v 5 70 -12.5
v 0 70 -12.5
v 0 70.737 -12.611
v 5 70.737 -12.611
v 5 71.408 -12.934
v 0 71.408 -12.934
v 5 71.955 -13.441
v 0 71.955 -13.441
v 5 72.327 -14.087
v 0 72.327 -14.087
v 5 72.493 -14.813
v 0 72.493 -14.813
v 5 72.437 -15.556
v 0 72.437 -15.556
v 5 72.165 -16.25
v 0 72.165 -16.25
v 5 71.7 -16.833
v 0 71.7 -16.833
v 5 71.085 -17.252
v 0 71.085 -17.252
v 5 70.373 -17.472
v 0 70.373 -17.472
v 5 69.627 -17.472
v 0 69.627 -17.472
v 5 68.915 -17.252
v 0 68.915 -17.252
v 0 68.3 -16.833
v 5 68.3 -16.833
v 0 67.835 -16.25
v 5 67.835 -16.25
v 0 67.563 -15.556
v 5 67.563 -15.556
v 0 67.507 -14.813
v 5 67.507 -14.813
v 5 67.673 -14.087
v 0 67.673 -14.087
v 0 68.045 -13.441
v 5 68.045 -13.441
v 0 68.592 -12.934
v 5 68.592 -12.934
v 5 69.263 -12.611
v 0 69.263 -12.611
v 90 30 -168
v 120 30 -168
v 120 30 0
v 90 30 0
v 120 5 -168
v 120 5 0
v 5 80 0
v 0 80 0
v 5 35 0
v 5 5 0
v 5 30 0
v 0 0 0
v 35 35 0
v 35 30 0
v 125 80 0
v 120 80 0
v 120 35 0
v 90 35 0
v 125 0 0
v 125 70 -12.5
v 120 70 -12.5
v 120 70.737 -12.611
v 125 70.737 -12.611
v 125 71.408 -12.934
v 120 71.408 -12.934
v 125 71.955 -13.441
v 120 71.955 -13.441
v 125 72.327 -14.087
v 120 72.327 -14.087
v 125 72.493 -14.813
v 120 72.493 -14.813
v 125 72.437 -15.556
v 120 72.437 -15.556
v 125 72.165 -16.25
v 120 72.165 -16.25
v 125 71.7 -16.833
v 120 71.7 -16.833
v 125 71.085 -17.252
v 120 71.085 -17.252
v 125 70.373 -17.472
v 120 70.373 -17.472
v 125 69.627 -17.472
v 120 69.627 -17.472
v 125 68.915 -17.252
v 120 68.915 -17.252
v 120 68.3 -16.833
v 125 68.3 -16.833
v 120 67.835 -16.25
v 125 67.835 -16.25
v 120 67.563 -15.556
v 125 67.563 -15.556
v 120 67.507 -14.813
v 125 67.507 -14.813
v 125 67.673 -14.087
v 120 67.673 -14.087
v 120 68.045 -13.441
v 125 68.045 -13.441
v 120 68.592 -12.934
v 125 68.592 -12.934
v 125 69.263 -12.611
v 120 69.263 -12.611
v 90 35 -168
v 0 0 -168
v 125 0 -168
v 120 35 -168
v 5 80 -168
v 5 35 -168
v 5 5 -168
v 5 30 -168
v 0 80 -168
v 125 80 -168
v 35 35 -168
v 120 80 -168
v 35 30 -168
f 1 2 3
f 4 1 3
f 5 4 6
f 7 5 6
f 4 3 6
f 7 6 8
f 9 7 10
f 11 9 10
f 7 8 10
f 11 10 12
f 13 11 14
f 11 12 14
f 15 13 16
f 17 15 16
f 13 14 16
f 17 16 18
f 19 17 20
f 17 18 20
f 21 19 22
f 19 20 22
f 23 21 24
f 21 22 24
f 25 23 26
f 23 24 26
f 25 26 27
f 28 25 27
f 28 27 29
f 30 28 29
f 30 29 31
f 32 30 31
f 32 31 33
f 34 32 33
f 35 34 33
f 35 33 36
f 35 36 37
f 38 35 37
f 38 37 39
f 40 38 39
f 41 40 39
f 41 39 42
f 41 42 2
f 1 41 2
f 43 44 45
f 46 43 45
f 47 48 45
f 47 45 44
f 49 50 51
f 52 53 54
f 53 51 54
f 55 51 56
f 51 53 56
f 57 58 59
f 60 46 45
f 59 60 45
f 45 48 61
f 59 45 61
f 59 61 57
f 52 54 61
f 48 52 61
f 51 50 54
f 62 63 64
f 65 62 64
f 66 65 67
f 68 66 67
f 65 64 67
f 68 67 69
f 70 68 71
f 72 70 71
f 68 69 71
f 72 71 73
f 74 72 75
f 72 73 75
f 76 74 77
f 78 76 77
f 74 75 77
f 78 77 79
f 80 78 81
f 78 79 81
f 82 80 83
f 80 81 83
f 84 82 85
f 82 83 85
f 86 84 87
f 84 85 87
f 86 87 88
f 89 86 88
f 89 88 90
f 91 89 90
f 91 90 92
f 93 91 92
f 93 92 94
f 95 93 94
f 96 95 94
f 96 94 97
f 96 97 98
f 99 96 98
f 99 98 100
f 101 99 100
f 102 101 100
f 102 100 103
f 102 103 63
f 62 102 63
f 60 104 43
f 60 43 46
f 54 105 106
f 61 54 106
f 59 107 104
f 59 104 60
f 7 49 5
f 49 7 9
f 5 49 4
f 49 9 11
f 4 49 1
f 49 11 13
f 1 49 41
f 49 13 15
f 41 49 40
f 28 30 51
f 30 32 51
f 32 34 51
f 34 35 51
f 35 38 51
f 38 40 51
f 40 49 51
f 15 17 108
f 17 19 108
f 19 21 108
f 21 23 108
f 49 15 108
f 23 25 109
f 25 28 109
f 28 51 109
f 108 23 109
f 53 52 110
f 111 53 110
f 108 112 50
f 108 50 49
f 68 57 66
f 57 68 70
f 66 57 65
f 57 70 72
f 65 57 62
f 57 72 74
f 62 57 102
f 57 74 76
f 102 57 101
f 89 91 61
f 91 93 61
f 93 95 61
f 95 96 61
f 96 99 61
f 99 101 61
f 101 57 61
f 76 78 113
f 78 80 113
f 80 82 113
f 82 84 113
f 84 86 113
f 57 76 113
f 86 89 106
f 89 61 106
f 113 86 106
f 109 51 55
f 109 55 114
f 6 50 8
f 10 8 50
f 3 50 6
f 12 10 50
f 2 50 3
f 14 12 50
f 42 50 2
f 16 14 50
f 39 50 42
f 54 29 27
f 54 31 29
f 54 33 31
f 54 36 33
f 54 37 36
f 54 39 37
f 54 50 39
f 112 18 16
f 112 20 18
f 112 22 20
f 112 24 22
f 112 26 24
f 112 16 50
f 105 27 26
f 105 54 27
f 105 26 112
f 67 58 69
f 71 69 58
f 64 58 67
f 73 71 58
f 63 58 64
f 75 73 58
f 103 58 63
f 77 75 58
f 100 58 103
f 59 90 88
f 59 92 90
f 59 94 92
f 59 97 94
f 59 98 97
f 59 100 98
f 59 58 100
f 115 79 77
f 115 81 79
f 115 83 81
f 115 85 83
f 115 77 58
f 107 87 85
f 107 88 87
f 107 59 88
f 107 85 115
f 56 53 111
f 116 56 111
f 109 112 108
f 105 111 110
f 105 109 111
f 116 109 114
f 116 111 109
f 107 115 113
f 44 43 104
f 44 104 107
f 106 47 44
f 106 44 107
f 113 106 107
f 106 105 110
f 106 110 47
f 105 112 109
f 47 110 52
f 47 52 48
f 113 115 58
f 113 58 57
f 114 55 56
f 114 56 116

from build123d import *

# Parameters (mm, degrees)
CROQUIS1_W                 = 125
CROQUIS1_H                 = 168
SALIENTE_EXTRUIR1_DEPTH    = 5
CROQUIS2_W                 = 5
CROQUIS2_H                 = 168
SALIENTE_EXTRUIR2_DEPTH    = 75
CROQUIS3_W                 = 5
CROQUIS3_H                 = 168
SALIENTE_EXTRUIR3_DEPTH    = 75
CROQUIS4_W                 = 168
CROQUIS4_H                 = 5
SALIENTE_EXTRUIR4_DEPTH    = 30
CROQUIS5_W                 = 168
CROQUIS5_H                 = 5
SALIENTE_EXTRUIR5_DEPTH    = 30
CROQUIS6_R                 = 2.5
CORTAR_EXTRUIR1_DEPTH      = 31
CORTAR_EXTRUIR1_DEPTH_BACK = 135


with BuildPart() as part:
    # Croquis1 → Saliente-Extruir1 (new body)
    with BuildSketch(Plane(origin=(0, 0, 0), x_dir=(1, 0, 0), z_dir=(0, 1, 0))):
        with Locations((62.5, 84)):
            Rectangle(CROQUIS1_W, CROQUIS1_H)
    extrude(amount=SALIENTE_EXTRUIR1_DEPTH)

    # Croquis2 → Saliente-Extruir2 (add)
    with BuildSketch(Plane(origin=(0, 5, 0), x_dir=(1, 0, 0), z_dir=(0, 1, 0))):
        with Locations((2.5, 84)):
            Rectangle(CROQUIS2_W, CROQUIS2_H)
    extrude(amount=SALIENTE_EXTRUIR2_DEPTH)

    # Croquis3 → Saliente-Extruir3 (add)
    with BuildSketch(Plane(origin=(0, 5, 0), x_dir=(1, 0, 0), z_dir=(0, 1, 0))):
        with Locations((122.5, 84)):
            Rectangle(CROQUIS3_W, CROQUIS3_H)
    extrude(amount=SALIENTE_EXTRUIR3_DEPTH)

    # Croquis4 → Saliente-Extruir4 (add)
    with BuildSketch(Plane(origin=(5, 0, 0), x_dir=(0, 0, -1), z_dir=(1, 0, 0))):
        with Locations((84, 32.5)):
            Rectangle(CROQUIS4_W, CROQUIS4_H)
    extrude(amount=SALIENTE_EXTRUIR4_DEPTH)

    # Croquis5 → Saliente-Extruir5 (add)
    with BuildSketch(Plane.ZY.offset(-120)):
        with Locations((-84, 32.5)):
            Rectangle(CROQUIS5_W, CROQUIS5_H)
    extrude(amount=SALIENTE_EXTRUIR5_DEPTH)

    # Croquis6 → Cortar-Extruir1 (cut, two sides)
    with BuildSketch(Plane.ZY) as cortar_extruir1_sk:
        with Locations((-15, 70)):
            Circle(CROQUIS6_R)
    extrude(amount=CORTAR_EXTRUIR1_DEPTH, mode=Mode.SUBTRACT)
    extrude(cortar_extruir1_sk.sketch, amount=-CORTAR_EXTRUIR1_DEPTH_BACK, mode=Mode.SUBTRACT)


solid = part.part
